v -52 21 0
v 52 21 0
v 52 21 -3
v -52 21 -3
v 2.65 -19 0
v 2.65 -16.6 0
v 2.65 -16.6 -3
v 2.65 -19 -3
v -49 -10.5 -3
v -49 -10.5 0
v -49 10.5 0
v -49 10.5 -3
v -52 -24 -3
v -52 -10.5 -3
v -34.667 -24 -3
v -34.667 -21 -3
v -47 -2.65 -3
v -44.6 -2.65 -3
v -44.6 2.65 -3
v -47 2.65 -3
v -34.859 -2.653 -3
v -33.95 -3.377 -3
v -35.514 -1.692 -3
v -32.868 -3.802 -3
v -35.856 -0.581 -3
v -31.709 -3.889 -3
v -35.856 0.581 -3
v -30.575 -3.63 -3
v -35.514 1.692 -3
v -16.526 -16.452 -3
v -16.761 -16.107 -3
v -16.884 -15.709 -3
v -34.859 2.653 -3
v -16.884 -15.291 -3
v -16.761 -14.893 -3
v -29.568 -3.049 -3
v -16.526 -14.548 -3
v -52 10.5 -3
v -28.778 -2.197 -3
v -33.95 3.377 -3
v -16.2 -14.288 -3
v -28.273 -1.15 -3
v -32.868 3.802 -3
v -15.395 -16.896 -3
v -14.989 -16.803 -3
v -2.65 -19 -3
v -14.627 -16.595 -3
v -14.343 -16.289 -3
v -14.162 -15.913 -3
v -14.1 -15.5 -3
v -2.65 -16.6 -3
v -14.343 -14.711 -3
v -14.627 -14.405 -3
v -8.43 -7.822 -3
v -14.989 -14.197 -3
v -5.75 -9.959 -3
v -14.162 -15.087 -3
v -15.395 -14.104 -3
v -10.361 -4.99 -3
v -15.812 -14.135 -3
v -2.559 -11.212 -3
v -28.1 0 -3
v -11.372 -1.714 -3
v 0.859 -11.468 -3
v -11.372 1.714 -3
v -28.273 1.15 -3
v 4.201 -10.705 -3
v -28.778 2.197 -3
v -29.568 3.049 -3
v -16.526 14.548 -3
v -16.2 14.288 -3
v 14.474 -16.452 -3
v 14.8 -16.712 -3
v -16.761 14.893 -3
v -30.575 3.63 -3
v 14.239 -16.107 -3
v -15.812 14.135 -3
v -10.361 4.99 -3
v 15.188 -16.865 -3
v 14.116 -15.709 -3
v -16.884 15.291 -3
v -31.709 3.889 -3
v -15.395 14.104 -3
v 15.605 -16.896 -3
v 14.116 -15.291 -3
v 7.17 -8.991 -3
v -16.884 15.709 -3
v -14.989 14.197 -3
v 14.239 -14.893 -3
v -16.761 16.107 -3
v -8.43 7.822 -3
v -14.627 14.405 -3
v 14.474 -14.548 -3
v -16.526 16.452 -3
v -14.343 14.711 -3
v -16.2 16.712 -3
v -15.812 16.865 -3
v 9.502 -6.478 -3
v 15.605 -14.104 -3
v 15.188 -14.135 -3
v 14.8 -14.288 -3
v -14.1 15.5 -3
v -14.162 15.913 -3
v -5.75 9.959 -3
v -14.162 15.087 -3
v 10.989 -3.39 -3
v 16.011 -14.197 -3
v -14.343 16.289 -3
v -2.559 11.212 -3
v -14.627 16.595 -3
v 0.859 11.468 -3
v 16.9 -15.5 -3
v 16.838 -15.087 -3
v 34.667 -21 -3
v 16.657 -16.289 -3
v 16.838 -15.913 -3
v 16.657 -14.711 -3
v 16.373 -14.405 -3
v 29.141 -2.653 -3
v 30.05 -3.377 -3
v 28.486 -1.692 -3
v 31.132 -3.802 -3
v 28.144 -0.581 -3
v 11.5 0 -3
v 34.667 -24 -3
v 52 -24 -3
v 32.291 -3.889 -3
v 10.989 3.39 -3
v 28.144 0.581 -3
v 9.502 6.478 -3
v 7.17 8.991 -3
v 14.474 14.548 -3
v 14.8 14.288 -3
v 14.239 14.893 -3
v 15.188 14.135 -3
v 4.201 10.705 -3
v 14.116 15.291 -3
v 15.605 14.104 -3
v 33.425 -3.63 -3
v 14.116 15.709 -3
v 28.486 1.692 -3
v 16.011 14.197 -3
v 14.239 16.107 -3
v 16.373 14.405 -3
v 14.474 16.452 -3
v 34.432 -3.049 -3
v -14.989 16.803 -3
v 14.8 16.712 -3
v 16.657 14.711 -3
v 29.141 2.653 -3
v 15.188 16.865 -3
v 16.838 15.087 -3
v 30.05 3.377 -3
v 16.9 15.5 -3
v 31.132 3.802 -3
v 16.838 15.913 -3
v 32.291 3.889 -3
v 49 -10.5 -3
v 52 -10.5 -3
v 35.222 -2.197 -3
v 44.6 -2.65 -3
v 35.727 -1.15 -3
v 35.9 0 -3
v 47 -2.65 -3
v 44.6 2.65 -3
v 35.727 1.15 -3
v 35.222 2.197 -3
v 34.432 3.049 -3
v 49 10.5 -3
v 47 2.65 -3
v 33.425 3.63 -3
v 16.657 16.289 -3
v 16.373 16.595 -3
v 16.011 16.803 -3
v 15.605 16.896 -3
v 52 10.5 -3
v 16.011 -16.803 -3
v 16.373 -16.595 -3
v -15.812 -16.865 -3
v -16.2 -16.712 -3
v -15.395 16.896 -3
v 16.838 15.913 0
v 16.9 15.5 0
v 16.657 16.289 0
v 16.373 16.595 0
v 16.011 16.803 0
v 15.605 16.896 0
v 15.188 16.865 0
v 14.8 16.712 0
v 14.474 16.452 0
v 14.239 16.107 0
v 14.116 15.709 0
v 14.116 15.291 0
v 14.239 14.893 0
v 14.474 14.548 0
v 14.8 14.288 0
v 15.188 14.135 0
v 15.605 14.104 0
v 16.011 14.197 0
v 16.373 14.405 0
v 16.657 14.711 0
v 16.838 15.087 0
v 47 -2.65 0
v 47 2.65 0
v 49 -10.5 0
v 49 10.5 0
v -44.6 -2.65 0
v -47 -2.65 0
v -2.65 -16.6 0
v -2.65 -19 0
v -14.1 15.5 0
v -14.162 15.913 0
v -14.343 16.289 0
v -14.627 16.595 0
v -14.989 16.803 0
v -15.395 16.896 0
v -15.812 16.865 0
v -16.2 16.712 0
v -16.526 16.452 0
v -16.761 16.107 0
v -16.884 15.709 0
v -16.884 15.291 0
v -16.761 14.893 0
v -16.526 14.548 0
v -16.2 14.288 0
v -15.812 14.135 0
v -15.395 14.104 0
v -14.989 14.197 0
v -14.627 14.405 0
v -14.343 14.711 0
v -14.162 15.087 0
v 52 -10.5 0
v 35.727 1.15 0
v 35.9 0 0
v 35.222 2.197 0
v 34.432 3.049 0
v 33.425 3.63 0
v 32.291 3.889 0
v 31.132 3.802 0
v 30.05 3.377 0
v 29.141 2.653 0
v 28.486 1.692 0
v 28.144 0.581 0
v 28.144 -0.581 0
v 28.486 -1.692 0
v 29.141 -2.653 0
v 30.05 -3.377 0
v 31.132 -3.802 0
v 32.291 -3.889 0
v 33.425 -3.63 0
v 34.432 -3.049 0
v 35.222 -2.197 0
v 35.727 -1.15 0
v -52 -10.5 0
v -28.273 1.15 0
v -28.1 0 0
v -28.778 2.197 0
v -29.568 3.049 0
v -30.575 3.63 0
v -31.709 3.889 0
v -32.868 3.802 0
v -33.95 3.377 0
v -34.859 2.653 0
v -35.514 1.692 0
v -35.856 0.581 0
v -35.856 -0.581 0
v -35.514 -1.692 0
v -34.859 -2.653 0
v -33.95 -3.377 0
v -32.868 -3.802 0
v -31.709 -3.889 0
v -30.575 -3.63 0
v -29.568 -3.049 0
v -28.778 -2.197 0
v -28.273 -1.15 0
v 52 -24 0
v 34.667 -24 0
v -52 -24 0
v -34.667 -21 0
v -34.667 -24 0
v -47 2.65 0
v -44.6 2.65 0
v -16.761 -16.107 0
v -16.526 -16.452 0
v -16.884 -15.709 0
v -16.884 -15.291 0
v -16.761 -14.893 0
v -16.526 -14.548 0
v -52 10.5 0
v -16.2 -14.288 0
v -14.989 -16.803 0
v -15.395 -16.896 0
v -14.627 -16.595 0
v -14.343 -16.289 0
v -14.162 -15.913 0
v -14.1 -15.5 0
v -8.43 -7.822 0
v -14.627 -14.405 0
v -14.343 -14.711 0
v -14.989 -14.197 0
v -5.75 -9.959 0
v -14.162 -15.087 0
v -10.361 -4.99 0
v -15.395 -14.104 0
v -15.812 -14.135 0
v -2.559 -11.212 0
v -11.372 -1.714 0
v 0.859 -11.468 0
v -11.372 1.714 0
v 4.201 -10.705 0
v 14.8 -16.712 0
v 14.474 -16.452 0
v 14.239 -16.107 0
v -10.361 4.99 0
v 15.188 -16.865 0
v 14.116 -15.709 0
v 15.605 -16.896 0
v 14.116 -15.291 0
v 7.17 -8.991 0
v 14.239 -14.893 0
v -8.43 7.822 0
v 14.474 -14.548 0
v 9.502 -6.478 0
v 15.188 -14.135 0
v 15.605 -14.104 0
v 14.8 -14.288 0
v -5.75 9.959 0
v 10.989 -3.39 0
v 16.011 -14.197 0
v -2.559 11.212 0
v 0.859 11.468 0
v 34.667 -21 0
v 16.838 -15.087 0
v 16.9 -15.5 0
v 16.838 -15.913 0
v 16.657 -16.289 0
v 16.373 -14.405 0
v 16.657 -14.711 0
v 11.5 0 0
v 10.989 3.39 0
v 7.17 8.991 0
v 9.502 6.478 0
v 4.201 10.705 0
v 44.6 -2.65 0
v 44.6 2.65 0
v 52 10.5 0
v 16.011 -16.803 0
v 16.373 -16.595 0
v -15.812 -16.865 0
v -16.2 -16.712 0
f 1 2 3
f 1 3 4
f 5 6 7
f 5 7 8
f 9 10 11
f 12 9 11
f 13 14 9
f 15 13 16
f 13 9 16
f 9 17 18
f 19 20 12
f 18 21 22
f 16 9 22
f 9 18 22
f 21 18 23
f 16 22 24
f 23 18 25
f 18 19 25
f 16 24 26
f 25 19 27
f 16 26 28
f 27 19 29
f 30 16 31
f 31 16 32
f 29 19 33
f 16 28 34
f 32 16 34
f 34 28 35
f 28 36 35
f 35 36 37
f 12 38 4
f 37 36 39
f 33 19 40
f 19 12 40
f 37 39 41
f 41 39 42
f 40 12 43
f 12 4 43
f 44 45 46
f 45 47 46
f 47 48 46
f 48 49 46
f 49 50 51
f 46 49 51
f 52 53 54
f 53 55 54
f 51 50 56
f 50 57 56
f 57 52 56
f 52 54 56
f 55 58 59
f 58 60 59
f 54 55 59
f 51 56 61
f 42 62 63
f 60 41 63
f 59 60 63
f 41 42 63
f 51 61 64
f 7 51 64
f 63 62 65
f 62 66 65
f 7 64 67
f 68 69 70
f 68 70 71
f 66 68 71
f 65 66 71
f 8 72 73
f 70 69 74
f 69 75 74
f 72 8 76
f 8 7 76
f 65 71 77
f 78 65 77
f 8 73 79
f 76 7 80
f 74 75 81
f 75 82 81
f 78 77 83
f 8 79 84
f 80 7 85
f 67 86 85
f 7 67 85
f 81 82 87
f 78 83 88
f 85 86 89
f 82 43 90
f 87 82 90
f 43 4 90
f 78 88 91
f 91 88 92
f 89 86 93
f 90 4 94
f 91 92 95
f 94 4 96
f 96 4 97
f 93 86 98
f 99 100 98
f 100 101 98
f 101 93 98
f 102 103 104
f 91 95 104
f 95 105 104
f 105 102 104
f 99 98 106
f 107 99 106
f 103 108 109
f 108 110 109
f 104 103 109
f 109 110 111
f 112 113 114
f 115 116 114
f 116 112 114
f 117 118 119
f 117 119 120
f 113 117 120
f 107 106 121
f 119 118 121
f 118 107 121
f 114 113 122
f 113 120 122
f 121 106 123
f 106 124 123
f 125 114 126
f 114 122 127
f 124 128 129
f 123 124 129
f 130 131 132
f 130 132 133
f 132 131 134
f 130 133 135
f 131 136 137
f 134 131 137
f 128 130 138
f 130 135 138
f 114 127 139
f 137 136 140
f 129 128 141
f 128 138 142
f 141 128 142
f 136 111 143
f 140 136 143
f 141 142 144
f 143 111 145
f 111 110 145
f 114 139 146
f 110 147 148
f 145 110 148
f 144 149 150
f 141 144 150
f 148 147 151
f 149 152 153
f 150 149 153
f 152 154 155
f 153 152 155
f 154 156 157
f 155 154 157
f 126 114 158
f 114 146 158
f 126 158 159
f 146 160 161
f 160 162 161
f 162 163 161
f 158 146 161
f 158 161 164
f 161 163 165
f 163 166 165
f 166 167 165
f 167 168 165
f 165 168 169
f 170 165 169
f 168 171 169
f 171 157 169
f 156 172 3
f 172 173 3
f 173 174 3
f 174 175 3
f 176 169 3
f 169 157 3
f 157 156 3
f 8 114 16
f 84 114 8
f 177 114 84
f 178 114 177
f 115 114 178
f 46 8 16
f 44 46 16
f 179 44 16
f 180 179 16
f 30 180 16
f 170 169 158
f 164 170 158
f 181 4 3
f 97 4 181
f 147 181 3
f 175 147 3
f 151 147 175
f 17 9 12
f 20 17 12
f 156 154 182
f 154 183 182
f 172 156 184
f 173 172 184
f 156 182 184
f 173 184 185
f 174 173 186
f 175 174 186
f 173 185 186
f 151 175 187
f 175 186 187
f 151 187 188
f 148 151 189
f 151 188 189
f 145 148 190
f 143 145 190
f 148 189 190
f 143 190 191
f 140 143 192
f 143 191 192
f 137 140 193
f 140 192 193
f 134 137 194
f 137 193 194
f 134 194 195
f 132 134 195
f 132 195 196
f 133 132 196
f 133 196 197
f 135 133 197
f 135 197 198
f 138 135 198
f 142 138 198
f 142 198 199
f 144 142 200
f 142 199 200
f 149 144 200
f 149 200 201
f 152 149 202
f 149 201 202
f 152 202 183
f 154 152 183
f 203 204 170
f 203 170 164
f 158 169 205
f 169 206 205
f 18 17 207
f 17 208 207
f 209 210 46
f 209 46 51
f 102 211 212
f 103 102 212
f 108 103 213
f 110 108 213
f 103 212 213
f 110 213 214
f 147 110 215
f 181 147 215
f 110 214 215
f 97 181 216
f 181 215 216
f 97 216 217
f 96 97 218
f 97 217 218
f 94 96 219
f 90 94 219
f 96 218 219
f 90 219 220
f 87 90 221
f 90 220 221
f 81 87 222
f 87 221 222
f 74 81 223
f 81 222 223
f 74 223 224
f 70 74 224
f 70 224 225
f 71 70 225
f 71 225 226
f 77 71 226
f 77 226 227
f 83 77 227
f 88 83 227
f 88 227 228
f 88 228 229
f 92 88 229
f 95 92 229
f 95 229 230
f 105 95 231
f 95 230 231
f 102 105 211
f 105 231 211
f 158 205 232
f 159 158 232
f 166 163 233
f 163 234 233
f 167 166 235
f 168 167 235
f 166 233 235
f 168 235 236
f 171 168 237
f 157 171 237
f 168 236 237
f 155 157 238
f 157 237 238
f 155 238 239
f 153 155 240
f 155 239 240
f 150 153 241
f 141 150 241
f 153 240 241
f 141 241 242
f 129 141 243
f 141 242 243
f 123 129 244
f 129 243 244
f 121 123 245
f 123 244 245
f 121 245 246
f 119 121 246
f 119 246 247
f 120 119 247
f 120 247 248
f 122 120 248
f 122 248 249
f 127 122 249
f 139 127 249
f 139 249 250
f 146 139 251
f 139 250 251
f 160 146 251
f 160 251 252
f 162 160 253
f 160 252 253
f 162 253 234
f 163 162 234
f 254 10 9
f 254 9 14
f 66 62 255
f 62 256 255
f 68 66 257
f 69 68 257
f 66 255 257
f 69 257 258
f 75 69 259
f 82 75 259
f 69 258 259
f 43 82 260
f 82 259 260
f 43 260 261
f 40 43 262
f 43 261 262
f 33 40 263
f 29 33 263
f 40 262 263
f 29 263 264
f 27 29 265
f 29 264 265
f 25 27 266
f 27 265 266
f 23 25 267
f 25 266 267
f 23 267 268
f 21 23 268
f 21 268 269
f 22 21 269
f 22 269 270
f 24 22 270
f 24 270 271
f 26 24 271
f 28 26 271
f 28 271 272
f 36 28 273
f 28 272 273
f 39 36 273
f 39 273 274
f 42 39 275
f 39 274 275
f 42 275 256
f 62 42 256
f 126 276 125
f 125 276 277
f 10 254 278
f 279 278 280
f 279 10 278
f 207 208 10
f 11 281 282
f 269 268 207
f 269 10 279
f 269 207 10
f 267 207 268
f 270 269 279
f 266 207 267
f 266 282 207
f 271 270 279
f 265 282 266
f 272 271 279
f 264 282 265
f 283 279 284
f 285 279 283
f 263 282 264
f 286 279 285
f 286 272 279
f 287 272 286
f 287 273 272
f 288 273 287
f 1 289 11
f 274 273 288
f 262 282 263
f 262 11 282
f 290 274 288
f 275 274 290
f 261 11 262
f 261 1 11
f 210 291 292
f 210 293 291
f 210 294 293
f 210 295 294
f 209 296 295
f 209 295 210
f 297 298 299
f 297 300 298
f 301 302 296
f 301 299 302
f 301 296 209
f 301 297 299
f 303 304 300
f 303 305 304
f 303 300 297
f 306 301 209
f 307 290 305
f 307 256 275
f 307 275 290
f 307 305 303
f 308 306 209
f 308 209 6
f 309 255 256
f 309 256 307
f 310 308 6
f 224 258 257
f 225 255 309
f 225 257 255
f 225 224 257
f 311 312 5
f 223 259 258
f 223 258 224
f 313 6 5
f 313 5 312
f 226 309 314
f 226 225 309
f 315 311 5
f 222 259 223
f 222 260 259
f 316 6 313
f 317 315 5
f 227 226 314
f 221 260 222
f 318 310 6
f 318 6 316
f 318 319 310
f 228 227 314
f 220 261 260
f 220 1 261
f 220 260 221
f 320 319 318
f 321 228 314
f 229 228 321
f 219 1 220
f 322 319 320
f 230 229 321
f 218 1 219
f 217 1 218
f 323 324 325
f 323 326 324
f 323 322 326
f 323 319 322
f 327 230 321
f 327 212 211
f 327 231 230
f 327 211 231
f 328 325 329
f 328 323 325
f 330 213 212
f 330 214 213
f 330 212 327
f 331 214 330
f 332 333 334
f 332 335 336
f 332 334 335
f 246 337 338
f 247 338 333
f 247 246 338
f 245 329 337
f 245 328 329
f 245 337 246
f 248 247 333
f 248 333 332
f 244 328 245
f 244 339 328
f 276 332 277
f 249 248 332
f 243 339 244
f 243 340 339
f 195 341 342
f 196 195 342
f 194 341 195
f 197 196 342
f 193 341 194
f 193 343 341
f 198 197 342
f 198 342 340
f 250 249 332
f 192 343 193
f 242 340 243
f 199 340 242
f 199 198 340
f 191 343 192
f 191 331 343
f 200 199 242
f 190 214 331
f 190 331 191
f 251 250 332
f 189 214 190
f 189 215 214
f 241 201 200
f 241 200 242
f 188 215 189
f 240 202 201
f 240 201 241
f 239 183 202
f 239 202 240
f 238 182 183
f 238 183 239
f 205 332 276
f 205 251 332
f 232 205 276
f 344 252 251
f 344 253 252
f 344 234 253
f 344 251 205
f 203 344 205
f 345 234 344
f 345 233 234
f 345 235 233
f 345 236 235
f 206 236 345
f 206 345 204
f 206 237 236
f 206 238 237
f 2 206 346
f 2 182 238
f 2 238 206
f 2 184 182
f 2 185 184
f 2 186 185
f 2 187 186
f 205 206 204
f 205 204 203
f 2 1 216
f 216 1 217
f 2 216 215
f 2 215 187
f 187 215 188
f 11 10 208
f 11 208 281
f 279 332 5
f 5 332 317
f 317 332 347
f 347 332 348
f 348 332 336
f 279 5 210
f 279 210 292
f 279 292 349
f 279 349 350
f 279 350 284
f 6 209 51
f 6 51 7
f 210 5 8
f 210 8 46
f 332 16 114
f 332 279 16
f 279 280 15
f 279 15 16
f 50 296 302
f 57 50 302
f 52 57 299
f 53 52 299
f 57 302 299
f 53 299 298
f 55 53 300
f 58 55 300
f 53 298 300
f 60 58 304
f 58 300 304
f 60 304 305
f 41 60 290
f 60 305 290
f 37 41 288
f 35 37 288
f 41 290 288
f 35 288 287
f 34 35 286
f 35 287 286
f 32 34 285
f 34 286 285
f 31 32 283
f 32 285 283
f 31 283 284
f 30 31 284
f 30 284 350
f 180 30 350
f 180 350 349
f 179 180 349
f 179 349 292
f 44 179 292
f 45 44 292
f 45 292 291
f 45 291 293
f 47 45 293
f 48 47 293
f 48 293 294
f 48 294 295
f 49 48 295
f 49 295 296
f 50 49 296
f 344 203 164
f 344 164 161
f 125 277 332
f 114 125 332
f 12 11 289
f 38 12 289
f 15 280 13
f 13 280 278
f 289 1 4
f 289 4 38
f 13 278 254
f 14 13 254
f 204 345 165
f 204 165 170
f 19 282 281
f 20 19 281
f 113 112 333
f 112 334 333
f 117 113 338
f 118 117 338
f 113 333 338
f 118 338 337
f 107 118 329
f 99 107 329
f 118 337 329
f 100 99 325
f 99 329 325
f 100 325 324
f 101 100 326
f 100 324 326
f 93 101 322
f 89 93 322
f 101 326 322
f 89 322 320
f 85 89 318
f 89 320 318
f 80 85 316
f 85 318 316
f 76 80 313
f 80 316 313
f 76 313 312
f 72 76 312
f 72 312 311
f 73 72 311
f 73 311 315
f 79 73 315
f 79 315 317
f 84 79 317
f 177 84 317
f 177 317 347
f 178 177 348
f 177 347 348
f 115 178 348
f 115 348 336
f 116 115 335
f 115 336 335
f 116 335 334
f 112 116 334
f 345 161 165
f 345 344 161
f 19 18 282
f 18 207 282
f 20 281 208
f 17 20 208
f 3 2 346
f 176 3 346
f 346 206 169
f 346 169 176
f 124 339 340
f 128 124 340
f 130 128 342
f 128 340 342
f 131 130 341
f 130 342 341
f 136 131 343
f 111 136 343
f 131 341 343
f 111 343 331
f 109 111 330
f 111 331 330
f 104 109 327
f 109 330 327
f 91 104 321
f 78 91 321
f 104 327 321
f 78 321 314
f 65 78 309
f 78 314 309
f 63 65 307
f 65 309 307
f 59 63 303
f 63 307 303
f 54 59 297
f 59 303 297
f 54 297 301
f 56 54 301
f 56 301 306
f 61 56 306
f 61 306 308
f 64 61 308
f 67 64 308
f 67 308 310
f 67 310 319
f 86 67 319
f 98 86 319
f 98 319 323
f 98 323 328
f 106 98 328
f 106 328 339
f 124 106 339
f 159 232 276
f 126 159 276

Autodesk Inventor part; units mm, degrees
ref_plane "YZ Plane" through (0, 0, 0) normal (1, 0, 0) x (0, 1, 0)
ref_plane "XZ Plane" through (0, 0, 0) normal (0, 1, 0) x (-1, 0, 0)
ref_plane "XY Plane" through (0, 0, 0) normal (0, 0, 1) x (1, 0, 0)
sketch "Sketch1" plane through (0, 0, 0) normal (0, 0, 1) x (1, 0, 0)
  line L0 (49, 21) -> (-49, 21)
  line L1 (-49, -21) -> (-21, -21)
  circle A0 centre (32, 0) radius 3.9
  circle A1 centre (-32, 0) radius 3.9
  line L2 (49, 21) -> (49, 10.5)
  line L3 (-49, -21) -> (-49, -10.5)
  line L4 (0, 41.7106) -> (0, -39.2634) construction
  line L5 (-50.5476, 0) -> (60.8869, 0) construction
  circle A2 centre (0, 0) radius 11.5
  line L6 (21, 21) -> (21, -21) construction
  line L7 (-21, -21) -> (-21, 21) construction
  line L8 (49, 21) -> (52, 21)
  line L9 (52, 21) -> (52, 10.5)
  line L10 (52, -21) -> (49, -21)
  line L11 (49, 10.5) -> (52, 10.5)
  line L12 (49, -10.5) -> (52, -10.5)
  line L13 (49, 10.5) -> (49, -10.5)
  line L14 (49, -10.5) -> (49, -21)
  line L15 (52, -10.5) -> (52, -21)
  line L16 (52, 10.5) -> (52, -10.5)
  line L17 (44.6, 2.65) -> (47, 2.65)
  line L18 (47, 2.65) -> (47, -2.65)
  line L19 (47, -2.65) -> (44.6, -2.65)
  line L20 (44.6, -2.65) -> (44.6, 2.65)
  line L21 (-49, 21) -> (-52, 21)
  line L22 (-52, 21) -> (-52, 10.5)
  line L23 (-49, 10.5) -> (-52, 10.5)
  line L24 (-49, -10.5) -> (-52, -10.5)
  line L25 (-52, -10.5) -> (-52, -21)
  line L26 (-52, 10.5) -> (-52, -10.5)
  line L27 (-44.6, 2.65) -> (-47, 2.65)
  line L28 (-47, 2.65) -> (-47, -2.65)
  line L29 (-47, -2.65) -> (-44.6, -2.65)
  line L30 (-44.6, -2.65) -> (-44.6, 2.65)
  line L31 (-52, -21) -> (-49, -21)
  line L32 (-49, 10.5) -> (-49, 21)
  line L33 (-49, -10.5) -> (-49, 10.5)
  line L34 (52, -21) -> (52, -24)
  line L35 (52, -24) -> (-52, -24)
  line L36 (-52, -24) -> (-52, -21)
  line L37 (34.6667, -24) -> (34.6667, -21)
  line L38 (-34.6667, -24) -> (-34.6667, -21)
  line L39 (-2.65, -16.6) -> (2.65, -16.6)
  line L40 (2.65, -16.6) -> (2.65, -19)
  line L41 (2.65, -19) -> (-2.65, -19)
  line L42 (-2.65, -19) -> (-2.65, -16.6)
  line L43 (21, -21) -> (49, -21)
  line L44 (-21, -21) -> (21, -21)
  circle A3 centre (-15.5, 15.5) radius 1.4
  circle A4 centre (-15.5, -15.5) radius 1.4
  circle A5 centre (15.5, -15.5) radius 1.4
  circle A6 centre (15.5, 15.5) radius 1.4
  dimension "d4" = 7.8
  dimension "d5" = 7.8
  dimension "d111" = 42
  dimension "d115" = 21
  dimension "d116" = 21
  dimension "d117" = 23
  dimension "d118" = 42
  dimension "d123" = 3
  dimension "d124" = 21
  dimension "d125" = 5.3
  dimension "d126" = 2.4
  dimension "d128" = 5
  dimension "d129" = 3
  dimension "d130" = 104
  dimension "d131" = 69.3333
  dimension "d132" = 5.3
  dimension "d133" = 2.4
  dimension "d134" = 5
  dimension "d135" = 2.8
  dimension "d136" = 5.5
  dimension "d137" = 5.5
  dimension "d140" = 360
  dimension "d143" = 12.6
extrude "Extrusion1" add sketch "Sketch1" against normal blind 3 contours L2 L13 L14 L43 L44 L1 L3 L33 L32 L0 | L8 L9 L11 L2 | L32 L23 L22 L21 | L12 L15 L10 L14 | L3 L31 L25 L24 | L10 L34 L35 L37 L43 | L1 L38 L35 L36 L31
properties part number "X-Motor-Housing_Front-Inner"
